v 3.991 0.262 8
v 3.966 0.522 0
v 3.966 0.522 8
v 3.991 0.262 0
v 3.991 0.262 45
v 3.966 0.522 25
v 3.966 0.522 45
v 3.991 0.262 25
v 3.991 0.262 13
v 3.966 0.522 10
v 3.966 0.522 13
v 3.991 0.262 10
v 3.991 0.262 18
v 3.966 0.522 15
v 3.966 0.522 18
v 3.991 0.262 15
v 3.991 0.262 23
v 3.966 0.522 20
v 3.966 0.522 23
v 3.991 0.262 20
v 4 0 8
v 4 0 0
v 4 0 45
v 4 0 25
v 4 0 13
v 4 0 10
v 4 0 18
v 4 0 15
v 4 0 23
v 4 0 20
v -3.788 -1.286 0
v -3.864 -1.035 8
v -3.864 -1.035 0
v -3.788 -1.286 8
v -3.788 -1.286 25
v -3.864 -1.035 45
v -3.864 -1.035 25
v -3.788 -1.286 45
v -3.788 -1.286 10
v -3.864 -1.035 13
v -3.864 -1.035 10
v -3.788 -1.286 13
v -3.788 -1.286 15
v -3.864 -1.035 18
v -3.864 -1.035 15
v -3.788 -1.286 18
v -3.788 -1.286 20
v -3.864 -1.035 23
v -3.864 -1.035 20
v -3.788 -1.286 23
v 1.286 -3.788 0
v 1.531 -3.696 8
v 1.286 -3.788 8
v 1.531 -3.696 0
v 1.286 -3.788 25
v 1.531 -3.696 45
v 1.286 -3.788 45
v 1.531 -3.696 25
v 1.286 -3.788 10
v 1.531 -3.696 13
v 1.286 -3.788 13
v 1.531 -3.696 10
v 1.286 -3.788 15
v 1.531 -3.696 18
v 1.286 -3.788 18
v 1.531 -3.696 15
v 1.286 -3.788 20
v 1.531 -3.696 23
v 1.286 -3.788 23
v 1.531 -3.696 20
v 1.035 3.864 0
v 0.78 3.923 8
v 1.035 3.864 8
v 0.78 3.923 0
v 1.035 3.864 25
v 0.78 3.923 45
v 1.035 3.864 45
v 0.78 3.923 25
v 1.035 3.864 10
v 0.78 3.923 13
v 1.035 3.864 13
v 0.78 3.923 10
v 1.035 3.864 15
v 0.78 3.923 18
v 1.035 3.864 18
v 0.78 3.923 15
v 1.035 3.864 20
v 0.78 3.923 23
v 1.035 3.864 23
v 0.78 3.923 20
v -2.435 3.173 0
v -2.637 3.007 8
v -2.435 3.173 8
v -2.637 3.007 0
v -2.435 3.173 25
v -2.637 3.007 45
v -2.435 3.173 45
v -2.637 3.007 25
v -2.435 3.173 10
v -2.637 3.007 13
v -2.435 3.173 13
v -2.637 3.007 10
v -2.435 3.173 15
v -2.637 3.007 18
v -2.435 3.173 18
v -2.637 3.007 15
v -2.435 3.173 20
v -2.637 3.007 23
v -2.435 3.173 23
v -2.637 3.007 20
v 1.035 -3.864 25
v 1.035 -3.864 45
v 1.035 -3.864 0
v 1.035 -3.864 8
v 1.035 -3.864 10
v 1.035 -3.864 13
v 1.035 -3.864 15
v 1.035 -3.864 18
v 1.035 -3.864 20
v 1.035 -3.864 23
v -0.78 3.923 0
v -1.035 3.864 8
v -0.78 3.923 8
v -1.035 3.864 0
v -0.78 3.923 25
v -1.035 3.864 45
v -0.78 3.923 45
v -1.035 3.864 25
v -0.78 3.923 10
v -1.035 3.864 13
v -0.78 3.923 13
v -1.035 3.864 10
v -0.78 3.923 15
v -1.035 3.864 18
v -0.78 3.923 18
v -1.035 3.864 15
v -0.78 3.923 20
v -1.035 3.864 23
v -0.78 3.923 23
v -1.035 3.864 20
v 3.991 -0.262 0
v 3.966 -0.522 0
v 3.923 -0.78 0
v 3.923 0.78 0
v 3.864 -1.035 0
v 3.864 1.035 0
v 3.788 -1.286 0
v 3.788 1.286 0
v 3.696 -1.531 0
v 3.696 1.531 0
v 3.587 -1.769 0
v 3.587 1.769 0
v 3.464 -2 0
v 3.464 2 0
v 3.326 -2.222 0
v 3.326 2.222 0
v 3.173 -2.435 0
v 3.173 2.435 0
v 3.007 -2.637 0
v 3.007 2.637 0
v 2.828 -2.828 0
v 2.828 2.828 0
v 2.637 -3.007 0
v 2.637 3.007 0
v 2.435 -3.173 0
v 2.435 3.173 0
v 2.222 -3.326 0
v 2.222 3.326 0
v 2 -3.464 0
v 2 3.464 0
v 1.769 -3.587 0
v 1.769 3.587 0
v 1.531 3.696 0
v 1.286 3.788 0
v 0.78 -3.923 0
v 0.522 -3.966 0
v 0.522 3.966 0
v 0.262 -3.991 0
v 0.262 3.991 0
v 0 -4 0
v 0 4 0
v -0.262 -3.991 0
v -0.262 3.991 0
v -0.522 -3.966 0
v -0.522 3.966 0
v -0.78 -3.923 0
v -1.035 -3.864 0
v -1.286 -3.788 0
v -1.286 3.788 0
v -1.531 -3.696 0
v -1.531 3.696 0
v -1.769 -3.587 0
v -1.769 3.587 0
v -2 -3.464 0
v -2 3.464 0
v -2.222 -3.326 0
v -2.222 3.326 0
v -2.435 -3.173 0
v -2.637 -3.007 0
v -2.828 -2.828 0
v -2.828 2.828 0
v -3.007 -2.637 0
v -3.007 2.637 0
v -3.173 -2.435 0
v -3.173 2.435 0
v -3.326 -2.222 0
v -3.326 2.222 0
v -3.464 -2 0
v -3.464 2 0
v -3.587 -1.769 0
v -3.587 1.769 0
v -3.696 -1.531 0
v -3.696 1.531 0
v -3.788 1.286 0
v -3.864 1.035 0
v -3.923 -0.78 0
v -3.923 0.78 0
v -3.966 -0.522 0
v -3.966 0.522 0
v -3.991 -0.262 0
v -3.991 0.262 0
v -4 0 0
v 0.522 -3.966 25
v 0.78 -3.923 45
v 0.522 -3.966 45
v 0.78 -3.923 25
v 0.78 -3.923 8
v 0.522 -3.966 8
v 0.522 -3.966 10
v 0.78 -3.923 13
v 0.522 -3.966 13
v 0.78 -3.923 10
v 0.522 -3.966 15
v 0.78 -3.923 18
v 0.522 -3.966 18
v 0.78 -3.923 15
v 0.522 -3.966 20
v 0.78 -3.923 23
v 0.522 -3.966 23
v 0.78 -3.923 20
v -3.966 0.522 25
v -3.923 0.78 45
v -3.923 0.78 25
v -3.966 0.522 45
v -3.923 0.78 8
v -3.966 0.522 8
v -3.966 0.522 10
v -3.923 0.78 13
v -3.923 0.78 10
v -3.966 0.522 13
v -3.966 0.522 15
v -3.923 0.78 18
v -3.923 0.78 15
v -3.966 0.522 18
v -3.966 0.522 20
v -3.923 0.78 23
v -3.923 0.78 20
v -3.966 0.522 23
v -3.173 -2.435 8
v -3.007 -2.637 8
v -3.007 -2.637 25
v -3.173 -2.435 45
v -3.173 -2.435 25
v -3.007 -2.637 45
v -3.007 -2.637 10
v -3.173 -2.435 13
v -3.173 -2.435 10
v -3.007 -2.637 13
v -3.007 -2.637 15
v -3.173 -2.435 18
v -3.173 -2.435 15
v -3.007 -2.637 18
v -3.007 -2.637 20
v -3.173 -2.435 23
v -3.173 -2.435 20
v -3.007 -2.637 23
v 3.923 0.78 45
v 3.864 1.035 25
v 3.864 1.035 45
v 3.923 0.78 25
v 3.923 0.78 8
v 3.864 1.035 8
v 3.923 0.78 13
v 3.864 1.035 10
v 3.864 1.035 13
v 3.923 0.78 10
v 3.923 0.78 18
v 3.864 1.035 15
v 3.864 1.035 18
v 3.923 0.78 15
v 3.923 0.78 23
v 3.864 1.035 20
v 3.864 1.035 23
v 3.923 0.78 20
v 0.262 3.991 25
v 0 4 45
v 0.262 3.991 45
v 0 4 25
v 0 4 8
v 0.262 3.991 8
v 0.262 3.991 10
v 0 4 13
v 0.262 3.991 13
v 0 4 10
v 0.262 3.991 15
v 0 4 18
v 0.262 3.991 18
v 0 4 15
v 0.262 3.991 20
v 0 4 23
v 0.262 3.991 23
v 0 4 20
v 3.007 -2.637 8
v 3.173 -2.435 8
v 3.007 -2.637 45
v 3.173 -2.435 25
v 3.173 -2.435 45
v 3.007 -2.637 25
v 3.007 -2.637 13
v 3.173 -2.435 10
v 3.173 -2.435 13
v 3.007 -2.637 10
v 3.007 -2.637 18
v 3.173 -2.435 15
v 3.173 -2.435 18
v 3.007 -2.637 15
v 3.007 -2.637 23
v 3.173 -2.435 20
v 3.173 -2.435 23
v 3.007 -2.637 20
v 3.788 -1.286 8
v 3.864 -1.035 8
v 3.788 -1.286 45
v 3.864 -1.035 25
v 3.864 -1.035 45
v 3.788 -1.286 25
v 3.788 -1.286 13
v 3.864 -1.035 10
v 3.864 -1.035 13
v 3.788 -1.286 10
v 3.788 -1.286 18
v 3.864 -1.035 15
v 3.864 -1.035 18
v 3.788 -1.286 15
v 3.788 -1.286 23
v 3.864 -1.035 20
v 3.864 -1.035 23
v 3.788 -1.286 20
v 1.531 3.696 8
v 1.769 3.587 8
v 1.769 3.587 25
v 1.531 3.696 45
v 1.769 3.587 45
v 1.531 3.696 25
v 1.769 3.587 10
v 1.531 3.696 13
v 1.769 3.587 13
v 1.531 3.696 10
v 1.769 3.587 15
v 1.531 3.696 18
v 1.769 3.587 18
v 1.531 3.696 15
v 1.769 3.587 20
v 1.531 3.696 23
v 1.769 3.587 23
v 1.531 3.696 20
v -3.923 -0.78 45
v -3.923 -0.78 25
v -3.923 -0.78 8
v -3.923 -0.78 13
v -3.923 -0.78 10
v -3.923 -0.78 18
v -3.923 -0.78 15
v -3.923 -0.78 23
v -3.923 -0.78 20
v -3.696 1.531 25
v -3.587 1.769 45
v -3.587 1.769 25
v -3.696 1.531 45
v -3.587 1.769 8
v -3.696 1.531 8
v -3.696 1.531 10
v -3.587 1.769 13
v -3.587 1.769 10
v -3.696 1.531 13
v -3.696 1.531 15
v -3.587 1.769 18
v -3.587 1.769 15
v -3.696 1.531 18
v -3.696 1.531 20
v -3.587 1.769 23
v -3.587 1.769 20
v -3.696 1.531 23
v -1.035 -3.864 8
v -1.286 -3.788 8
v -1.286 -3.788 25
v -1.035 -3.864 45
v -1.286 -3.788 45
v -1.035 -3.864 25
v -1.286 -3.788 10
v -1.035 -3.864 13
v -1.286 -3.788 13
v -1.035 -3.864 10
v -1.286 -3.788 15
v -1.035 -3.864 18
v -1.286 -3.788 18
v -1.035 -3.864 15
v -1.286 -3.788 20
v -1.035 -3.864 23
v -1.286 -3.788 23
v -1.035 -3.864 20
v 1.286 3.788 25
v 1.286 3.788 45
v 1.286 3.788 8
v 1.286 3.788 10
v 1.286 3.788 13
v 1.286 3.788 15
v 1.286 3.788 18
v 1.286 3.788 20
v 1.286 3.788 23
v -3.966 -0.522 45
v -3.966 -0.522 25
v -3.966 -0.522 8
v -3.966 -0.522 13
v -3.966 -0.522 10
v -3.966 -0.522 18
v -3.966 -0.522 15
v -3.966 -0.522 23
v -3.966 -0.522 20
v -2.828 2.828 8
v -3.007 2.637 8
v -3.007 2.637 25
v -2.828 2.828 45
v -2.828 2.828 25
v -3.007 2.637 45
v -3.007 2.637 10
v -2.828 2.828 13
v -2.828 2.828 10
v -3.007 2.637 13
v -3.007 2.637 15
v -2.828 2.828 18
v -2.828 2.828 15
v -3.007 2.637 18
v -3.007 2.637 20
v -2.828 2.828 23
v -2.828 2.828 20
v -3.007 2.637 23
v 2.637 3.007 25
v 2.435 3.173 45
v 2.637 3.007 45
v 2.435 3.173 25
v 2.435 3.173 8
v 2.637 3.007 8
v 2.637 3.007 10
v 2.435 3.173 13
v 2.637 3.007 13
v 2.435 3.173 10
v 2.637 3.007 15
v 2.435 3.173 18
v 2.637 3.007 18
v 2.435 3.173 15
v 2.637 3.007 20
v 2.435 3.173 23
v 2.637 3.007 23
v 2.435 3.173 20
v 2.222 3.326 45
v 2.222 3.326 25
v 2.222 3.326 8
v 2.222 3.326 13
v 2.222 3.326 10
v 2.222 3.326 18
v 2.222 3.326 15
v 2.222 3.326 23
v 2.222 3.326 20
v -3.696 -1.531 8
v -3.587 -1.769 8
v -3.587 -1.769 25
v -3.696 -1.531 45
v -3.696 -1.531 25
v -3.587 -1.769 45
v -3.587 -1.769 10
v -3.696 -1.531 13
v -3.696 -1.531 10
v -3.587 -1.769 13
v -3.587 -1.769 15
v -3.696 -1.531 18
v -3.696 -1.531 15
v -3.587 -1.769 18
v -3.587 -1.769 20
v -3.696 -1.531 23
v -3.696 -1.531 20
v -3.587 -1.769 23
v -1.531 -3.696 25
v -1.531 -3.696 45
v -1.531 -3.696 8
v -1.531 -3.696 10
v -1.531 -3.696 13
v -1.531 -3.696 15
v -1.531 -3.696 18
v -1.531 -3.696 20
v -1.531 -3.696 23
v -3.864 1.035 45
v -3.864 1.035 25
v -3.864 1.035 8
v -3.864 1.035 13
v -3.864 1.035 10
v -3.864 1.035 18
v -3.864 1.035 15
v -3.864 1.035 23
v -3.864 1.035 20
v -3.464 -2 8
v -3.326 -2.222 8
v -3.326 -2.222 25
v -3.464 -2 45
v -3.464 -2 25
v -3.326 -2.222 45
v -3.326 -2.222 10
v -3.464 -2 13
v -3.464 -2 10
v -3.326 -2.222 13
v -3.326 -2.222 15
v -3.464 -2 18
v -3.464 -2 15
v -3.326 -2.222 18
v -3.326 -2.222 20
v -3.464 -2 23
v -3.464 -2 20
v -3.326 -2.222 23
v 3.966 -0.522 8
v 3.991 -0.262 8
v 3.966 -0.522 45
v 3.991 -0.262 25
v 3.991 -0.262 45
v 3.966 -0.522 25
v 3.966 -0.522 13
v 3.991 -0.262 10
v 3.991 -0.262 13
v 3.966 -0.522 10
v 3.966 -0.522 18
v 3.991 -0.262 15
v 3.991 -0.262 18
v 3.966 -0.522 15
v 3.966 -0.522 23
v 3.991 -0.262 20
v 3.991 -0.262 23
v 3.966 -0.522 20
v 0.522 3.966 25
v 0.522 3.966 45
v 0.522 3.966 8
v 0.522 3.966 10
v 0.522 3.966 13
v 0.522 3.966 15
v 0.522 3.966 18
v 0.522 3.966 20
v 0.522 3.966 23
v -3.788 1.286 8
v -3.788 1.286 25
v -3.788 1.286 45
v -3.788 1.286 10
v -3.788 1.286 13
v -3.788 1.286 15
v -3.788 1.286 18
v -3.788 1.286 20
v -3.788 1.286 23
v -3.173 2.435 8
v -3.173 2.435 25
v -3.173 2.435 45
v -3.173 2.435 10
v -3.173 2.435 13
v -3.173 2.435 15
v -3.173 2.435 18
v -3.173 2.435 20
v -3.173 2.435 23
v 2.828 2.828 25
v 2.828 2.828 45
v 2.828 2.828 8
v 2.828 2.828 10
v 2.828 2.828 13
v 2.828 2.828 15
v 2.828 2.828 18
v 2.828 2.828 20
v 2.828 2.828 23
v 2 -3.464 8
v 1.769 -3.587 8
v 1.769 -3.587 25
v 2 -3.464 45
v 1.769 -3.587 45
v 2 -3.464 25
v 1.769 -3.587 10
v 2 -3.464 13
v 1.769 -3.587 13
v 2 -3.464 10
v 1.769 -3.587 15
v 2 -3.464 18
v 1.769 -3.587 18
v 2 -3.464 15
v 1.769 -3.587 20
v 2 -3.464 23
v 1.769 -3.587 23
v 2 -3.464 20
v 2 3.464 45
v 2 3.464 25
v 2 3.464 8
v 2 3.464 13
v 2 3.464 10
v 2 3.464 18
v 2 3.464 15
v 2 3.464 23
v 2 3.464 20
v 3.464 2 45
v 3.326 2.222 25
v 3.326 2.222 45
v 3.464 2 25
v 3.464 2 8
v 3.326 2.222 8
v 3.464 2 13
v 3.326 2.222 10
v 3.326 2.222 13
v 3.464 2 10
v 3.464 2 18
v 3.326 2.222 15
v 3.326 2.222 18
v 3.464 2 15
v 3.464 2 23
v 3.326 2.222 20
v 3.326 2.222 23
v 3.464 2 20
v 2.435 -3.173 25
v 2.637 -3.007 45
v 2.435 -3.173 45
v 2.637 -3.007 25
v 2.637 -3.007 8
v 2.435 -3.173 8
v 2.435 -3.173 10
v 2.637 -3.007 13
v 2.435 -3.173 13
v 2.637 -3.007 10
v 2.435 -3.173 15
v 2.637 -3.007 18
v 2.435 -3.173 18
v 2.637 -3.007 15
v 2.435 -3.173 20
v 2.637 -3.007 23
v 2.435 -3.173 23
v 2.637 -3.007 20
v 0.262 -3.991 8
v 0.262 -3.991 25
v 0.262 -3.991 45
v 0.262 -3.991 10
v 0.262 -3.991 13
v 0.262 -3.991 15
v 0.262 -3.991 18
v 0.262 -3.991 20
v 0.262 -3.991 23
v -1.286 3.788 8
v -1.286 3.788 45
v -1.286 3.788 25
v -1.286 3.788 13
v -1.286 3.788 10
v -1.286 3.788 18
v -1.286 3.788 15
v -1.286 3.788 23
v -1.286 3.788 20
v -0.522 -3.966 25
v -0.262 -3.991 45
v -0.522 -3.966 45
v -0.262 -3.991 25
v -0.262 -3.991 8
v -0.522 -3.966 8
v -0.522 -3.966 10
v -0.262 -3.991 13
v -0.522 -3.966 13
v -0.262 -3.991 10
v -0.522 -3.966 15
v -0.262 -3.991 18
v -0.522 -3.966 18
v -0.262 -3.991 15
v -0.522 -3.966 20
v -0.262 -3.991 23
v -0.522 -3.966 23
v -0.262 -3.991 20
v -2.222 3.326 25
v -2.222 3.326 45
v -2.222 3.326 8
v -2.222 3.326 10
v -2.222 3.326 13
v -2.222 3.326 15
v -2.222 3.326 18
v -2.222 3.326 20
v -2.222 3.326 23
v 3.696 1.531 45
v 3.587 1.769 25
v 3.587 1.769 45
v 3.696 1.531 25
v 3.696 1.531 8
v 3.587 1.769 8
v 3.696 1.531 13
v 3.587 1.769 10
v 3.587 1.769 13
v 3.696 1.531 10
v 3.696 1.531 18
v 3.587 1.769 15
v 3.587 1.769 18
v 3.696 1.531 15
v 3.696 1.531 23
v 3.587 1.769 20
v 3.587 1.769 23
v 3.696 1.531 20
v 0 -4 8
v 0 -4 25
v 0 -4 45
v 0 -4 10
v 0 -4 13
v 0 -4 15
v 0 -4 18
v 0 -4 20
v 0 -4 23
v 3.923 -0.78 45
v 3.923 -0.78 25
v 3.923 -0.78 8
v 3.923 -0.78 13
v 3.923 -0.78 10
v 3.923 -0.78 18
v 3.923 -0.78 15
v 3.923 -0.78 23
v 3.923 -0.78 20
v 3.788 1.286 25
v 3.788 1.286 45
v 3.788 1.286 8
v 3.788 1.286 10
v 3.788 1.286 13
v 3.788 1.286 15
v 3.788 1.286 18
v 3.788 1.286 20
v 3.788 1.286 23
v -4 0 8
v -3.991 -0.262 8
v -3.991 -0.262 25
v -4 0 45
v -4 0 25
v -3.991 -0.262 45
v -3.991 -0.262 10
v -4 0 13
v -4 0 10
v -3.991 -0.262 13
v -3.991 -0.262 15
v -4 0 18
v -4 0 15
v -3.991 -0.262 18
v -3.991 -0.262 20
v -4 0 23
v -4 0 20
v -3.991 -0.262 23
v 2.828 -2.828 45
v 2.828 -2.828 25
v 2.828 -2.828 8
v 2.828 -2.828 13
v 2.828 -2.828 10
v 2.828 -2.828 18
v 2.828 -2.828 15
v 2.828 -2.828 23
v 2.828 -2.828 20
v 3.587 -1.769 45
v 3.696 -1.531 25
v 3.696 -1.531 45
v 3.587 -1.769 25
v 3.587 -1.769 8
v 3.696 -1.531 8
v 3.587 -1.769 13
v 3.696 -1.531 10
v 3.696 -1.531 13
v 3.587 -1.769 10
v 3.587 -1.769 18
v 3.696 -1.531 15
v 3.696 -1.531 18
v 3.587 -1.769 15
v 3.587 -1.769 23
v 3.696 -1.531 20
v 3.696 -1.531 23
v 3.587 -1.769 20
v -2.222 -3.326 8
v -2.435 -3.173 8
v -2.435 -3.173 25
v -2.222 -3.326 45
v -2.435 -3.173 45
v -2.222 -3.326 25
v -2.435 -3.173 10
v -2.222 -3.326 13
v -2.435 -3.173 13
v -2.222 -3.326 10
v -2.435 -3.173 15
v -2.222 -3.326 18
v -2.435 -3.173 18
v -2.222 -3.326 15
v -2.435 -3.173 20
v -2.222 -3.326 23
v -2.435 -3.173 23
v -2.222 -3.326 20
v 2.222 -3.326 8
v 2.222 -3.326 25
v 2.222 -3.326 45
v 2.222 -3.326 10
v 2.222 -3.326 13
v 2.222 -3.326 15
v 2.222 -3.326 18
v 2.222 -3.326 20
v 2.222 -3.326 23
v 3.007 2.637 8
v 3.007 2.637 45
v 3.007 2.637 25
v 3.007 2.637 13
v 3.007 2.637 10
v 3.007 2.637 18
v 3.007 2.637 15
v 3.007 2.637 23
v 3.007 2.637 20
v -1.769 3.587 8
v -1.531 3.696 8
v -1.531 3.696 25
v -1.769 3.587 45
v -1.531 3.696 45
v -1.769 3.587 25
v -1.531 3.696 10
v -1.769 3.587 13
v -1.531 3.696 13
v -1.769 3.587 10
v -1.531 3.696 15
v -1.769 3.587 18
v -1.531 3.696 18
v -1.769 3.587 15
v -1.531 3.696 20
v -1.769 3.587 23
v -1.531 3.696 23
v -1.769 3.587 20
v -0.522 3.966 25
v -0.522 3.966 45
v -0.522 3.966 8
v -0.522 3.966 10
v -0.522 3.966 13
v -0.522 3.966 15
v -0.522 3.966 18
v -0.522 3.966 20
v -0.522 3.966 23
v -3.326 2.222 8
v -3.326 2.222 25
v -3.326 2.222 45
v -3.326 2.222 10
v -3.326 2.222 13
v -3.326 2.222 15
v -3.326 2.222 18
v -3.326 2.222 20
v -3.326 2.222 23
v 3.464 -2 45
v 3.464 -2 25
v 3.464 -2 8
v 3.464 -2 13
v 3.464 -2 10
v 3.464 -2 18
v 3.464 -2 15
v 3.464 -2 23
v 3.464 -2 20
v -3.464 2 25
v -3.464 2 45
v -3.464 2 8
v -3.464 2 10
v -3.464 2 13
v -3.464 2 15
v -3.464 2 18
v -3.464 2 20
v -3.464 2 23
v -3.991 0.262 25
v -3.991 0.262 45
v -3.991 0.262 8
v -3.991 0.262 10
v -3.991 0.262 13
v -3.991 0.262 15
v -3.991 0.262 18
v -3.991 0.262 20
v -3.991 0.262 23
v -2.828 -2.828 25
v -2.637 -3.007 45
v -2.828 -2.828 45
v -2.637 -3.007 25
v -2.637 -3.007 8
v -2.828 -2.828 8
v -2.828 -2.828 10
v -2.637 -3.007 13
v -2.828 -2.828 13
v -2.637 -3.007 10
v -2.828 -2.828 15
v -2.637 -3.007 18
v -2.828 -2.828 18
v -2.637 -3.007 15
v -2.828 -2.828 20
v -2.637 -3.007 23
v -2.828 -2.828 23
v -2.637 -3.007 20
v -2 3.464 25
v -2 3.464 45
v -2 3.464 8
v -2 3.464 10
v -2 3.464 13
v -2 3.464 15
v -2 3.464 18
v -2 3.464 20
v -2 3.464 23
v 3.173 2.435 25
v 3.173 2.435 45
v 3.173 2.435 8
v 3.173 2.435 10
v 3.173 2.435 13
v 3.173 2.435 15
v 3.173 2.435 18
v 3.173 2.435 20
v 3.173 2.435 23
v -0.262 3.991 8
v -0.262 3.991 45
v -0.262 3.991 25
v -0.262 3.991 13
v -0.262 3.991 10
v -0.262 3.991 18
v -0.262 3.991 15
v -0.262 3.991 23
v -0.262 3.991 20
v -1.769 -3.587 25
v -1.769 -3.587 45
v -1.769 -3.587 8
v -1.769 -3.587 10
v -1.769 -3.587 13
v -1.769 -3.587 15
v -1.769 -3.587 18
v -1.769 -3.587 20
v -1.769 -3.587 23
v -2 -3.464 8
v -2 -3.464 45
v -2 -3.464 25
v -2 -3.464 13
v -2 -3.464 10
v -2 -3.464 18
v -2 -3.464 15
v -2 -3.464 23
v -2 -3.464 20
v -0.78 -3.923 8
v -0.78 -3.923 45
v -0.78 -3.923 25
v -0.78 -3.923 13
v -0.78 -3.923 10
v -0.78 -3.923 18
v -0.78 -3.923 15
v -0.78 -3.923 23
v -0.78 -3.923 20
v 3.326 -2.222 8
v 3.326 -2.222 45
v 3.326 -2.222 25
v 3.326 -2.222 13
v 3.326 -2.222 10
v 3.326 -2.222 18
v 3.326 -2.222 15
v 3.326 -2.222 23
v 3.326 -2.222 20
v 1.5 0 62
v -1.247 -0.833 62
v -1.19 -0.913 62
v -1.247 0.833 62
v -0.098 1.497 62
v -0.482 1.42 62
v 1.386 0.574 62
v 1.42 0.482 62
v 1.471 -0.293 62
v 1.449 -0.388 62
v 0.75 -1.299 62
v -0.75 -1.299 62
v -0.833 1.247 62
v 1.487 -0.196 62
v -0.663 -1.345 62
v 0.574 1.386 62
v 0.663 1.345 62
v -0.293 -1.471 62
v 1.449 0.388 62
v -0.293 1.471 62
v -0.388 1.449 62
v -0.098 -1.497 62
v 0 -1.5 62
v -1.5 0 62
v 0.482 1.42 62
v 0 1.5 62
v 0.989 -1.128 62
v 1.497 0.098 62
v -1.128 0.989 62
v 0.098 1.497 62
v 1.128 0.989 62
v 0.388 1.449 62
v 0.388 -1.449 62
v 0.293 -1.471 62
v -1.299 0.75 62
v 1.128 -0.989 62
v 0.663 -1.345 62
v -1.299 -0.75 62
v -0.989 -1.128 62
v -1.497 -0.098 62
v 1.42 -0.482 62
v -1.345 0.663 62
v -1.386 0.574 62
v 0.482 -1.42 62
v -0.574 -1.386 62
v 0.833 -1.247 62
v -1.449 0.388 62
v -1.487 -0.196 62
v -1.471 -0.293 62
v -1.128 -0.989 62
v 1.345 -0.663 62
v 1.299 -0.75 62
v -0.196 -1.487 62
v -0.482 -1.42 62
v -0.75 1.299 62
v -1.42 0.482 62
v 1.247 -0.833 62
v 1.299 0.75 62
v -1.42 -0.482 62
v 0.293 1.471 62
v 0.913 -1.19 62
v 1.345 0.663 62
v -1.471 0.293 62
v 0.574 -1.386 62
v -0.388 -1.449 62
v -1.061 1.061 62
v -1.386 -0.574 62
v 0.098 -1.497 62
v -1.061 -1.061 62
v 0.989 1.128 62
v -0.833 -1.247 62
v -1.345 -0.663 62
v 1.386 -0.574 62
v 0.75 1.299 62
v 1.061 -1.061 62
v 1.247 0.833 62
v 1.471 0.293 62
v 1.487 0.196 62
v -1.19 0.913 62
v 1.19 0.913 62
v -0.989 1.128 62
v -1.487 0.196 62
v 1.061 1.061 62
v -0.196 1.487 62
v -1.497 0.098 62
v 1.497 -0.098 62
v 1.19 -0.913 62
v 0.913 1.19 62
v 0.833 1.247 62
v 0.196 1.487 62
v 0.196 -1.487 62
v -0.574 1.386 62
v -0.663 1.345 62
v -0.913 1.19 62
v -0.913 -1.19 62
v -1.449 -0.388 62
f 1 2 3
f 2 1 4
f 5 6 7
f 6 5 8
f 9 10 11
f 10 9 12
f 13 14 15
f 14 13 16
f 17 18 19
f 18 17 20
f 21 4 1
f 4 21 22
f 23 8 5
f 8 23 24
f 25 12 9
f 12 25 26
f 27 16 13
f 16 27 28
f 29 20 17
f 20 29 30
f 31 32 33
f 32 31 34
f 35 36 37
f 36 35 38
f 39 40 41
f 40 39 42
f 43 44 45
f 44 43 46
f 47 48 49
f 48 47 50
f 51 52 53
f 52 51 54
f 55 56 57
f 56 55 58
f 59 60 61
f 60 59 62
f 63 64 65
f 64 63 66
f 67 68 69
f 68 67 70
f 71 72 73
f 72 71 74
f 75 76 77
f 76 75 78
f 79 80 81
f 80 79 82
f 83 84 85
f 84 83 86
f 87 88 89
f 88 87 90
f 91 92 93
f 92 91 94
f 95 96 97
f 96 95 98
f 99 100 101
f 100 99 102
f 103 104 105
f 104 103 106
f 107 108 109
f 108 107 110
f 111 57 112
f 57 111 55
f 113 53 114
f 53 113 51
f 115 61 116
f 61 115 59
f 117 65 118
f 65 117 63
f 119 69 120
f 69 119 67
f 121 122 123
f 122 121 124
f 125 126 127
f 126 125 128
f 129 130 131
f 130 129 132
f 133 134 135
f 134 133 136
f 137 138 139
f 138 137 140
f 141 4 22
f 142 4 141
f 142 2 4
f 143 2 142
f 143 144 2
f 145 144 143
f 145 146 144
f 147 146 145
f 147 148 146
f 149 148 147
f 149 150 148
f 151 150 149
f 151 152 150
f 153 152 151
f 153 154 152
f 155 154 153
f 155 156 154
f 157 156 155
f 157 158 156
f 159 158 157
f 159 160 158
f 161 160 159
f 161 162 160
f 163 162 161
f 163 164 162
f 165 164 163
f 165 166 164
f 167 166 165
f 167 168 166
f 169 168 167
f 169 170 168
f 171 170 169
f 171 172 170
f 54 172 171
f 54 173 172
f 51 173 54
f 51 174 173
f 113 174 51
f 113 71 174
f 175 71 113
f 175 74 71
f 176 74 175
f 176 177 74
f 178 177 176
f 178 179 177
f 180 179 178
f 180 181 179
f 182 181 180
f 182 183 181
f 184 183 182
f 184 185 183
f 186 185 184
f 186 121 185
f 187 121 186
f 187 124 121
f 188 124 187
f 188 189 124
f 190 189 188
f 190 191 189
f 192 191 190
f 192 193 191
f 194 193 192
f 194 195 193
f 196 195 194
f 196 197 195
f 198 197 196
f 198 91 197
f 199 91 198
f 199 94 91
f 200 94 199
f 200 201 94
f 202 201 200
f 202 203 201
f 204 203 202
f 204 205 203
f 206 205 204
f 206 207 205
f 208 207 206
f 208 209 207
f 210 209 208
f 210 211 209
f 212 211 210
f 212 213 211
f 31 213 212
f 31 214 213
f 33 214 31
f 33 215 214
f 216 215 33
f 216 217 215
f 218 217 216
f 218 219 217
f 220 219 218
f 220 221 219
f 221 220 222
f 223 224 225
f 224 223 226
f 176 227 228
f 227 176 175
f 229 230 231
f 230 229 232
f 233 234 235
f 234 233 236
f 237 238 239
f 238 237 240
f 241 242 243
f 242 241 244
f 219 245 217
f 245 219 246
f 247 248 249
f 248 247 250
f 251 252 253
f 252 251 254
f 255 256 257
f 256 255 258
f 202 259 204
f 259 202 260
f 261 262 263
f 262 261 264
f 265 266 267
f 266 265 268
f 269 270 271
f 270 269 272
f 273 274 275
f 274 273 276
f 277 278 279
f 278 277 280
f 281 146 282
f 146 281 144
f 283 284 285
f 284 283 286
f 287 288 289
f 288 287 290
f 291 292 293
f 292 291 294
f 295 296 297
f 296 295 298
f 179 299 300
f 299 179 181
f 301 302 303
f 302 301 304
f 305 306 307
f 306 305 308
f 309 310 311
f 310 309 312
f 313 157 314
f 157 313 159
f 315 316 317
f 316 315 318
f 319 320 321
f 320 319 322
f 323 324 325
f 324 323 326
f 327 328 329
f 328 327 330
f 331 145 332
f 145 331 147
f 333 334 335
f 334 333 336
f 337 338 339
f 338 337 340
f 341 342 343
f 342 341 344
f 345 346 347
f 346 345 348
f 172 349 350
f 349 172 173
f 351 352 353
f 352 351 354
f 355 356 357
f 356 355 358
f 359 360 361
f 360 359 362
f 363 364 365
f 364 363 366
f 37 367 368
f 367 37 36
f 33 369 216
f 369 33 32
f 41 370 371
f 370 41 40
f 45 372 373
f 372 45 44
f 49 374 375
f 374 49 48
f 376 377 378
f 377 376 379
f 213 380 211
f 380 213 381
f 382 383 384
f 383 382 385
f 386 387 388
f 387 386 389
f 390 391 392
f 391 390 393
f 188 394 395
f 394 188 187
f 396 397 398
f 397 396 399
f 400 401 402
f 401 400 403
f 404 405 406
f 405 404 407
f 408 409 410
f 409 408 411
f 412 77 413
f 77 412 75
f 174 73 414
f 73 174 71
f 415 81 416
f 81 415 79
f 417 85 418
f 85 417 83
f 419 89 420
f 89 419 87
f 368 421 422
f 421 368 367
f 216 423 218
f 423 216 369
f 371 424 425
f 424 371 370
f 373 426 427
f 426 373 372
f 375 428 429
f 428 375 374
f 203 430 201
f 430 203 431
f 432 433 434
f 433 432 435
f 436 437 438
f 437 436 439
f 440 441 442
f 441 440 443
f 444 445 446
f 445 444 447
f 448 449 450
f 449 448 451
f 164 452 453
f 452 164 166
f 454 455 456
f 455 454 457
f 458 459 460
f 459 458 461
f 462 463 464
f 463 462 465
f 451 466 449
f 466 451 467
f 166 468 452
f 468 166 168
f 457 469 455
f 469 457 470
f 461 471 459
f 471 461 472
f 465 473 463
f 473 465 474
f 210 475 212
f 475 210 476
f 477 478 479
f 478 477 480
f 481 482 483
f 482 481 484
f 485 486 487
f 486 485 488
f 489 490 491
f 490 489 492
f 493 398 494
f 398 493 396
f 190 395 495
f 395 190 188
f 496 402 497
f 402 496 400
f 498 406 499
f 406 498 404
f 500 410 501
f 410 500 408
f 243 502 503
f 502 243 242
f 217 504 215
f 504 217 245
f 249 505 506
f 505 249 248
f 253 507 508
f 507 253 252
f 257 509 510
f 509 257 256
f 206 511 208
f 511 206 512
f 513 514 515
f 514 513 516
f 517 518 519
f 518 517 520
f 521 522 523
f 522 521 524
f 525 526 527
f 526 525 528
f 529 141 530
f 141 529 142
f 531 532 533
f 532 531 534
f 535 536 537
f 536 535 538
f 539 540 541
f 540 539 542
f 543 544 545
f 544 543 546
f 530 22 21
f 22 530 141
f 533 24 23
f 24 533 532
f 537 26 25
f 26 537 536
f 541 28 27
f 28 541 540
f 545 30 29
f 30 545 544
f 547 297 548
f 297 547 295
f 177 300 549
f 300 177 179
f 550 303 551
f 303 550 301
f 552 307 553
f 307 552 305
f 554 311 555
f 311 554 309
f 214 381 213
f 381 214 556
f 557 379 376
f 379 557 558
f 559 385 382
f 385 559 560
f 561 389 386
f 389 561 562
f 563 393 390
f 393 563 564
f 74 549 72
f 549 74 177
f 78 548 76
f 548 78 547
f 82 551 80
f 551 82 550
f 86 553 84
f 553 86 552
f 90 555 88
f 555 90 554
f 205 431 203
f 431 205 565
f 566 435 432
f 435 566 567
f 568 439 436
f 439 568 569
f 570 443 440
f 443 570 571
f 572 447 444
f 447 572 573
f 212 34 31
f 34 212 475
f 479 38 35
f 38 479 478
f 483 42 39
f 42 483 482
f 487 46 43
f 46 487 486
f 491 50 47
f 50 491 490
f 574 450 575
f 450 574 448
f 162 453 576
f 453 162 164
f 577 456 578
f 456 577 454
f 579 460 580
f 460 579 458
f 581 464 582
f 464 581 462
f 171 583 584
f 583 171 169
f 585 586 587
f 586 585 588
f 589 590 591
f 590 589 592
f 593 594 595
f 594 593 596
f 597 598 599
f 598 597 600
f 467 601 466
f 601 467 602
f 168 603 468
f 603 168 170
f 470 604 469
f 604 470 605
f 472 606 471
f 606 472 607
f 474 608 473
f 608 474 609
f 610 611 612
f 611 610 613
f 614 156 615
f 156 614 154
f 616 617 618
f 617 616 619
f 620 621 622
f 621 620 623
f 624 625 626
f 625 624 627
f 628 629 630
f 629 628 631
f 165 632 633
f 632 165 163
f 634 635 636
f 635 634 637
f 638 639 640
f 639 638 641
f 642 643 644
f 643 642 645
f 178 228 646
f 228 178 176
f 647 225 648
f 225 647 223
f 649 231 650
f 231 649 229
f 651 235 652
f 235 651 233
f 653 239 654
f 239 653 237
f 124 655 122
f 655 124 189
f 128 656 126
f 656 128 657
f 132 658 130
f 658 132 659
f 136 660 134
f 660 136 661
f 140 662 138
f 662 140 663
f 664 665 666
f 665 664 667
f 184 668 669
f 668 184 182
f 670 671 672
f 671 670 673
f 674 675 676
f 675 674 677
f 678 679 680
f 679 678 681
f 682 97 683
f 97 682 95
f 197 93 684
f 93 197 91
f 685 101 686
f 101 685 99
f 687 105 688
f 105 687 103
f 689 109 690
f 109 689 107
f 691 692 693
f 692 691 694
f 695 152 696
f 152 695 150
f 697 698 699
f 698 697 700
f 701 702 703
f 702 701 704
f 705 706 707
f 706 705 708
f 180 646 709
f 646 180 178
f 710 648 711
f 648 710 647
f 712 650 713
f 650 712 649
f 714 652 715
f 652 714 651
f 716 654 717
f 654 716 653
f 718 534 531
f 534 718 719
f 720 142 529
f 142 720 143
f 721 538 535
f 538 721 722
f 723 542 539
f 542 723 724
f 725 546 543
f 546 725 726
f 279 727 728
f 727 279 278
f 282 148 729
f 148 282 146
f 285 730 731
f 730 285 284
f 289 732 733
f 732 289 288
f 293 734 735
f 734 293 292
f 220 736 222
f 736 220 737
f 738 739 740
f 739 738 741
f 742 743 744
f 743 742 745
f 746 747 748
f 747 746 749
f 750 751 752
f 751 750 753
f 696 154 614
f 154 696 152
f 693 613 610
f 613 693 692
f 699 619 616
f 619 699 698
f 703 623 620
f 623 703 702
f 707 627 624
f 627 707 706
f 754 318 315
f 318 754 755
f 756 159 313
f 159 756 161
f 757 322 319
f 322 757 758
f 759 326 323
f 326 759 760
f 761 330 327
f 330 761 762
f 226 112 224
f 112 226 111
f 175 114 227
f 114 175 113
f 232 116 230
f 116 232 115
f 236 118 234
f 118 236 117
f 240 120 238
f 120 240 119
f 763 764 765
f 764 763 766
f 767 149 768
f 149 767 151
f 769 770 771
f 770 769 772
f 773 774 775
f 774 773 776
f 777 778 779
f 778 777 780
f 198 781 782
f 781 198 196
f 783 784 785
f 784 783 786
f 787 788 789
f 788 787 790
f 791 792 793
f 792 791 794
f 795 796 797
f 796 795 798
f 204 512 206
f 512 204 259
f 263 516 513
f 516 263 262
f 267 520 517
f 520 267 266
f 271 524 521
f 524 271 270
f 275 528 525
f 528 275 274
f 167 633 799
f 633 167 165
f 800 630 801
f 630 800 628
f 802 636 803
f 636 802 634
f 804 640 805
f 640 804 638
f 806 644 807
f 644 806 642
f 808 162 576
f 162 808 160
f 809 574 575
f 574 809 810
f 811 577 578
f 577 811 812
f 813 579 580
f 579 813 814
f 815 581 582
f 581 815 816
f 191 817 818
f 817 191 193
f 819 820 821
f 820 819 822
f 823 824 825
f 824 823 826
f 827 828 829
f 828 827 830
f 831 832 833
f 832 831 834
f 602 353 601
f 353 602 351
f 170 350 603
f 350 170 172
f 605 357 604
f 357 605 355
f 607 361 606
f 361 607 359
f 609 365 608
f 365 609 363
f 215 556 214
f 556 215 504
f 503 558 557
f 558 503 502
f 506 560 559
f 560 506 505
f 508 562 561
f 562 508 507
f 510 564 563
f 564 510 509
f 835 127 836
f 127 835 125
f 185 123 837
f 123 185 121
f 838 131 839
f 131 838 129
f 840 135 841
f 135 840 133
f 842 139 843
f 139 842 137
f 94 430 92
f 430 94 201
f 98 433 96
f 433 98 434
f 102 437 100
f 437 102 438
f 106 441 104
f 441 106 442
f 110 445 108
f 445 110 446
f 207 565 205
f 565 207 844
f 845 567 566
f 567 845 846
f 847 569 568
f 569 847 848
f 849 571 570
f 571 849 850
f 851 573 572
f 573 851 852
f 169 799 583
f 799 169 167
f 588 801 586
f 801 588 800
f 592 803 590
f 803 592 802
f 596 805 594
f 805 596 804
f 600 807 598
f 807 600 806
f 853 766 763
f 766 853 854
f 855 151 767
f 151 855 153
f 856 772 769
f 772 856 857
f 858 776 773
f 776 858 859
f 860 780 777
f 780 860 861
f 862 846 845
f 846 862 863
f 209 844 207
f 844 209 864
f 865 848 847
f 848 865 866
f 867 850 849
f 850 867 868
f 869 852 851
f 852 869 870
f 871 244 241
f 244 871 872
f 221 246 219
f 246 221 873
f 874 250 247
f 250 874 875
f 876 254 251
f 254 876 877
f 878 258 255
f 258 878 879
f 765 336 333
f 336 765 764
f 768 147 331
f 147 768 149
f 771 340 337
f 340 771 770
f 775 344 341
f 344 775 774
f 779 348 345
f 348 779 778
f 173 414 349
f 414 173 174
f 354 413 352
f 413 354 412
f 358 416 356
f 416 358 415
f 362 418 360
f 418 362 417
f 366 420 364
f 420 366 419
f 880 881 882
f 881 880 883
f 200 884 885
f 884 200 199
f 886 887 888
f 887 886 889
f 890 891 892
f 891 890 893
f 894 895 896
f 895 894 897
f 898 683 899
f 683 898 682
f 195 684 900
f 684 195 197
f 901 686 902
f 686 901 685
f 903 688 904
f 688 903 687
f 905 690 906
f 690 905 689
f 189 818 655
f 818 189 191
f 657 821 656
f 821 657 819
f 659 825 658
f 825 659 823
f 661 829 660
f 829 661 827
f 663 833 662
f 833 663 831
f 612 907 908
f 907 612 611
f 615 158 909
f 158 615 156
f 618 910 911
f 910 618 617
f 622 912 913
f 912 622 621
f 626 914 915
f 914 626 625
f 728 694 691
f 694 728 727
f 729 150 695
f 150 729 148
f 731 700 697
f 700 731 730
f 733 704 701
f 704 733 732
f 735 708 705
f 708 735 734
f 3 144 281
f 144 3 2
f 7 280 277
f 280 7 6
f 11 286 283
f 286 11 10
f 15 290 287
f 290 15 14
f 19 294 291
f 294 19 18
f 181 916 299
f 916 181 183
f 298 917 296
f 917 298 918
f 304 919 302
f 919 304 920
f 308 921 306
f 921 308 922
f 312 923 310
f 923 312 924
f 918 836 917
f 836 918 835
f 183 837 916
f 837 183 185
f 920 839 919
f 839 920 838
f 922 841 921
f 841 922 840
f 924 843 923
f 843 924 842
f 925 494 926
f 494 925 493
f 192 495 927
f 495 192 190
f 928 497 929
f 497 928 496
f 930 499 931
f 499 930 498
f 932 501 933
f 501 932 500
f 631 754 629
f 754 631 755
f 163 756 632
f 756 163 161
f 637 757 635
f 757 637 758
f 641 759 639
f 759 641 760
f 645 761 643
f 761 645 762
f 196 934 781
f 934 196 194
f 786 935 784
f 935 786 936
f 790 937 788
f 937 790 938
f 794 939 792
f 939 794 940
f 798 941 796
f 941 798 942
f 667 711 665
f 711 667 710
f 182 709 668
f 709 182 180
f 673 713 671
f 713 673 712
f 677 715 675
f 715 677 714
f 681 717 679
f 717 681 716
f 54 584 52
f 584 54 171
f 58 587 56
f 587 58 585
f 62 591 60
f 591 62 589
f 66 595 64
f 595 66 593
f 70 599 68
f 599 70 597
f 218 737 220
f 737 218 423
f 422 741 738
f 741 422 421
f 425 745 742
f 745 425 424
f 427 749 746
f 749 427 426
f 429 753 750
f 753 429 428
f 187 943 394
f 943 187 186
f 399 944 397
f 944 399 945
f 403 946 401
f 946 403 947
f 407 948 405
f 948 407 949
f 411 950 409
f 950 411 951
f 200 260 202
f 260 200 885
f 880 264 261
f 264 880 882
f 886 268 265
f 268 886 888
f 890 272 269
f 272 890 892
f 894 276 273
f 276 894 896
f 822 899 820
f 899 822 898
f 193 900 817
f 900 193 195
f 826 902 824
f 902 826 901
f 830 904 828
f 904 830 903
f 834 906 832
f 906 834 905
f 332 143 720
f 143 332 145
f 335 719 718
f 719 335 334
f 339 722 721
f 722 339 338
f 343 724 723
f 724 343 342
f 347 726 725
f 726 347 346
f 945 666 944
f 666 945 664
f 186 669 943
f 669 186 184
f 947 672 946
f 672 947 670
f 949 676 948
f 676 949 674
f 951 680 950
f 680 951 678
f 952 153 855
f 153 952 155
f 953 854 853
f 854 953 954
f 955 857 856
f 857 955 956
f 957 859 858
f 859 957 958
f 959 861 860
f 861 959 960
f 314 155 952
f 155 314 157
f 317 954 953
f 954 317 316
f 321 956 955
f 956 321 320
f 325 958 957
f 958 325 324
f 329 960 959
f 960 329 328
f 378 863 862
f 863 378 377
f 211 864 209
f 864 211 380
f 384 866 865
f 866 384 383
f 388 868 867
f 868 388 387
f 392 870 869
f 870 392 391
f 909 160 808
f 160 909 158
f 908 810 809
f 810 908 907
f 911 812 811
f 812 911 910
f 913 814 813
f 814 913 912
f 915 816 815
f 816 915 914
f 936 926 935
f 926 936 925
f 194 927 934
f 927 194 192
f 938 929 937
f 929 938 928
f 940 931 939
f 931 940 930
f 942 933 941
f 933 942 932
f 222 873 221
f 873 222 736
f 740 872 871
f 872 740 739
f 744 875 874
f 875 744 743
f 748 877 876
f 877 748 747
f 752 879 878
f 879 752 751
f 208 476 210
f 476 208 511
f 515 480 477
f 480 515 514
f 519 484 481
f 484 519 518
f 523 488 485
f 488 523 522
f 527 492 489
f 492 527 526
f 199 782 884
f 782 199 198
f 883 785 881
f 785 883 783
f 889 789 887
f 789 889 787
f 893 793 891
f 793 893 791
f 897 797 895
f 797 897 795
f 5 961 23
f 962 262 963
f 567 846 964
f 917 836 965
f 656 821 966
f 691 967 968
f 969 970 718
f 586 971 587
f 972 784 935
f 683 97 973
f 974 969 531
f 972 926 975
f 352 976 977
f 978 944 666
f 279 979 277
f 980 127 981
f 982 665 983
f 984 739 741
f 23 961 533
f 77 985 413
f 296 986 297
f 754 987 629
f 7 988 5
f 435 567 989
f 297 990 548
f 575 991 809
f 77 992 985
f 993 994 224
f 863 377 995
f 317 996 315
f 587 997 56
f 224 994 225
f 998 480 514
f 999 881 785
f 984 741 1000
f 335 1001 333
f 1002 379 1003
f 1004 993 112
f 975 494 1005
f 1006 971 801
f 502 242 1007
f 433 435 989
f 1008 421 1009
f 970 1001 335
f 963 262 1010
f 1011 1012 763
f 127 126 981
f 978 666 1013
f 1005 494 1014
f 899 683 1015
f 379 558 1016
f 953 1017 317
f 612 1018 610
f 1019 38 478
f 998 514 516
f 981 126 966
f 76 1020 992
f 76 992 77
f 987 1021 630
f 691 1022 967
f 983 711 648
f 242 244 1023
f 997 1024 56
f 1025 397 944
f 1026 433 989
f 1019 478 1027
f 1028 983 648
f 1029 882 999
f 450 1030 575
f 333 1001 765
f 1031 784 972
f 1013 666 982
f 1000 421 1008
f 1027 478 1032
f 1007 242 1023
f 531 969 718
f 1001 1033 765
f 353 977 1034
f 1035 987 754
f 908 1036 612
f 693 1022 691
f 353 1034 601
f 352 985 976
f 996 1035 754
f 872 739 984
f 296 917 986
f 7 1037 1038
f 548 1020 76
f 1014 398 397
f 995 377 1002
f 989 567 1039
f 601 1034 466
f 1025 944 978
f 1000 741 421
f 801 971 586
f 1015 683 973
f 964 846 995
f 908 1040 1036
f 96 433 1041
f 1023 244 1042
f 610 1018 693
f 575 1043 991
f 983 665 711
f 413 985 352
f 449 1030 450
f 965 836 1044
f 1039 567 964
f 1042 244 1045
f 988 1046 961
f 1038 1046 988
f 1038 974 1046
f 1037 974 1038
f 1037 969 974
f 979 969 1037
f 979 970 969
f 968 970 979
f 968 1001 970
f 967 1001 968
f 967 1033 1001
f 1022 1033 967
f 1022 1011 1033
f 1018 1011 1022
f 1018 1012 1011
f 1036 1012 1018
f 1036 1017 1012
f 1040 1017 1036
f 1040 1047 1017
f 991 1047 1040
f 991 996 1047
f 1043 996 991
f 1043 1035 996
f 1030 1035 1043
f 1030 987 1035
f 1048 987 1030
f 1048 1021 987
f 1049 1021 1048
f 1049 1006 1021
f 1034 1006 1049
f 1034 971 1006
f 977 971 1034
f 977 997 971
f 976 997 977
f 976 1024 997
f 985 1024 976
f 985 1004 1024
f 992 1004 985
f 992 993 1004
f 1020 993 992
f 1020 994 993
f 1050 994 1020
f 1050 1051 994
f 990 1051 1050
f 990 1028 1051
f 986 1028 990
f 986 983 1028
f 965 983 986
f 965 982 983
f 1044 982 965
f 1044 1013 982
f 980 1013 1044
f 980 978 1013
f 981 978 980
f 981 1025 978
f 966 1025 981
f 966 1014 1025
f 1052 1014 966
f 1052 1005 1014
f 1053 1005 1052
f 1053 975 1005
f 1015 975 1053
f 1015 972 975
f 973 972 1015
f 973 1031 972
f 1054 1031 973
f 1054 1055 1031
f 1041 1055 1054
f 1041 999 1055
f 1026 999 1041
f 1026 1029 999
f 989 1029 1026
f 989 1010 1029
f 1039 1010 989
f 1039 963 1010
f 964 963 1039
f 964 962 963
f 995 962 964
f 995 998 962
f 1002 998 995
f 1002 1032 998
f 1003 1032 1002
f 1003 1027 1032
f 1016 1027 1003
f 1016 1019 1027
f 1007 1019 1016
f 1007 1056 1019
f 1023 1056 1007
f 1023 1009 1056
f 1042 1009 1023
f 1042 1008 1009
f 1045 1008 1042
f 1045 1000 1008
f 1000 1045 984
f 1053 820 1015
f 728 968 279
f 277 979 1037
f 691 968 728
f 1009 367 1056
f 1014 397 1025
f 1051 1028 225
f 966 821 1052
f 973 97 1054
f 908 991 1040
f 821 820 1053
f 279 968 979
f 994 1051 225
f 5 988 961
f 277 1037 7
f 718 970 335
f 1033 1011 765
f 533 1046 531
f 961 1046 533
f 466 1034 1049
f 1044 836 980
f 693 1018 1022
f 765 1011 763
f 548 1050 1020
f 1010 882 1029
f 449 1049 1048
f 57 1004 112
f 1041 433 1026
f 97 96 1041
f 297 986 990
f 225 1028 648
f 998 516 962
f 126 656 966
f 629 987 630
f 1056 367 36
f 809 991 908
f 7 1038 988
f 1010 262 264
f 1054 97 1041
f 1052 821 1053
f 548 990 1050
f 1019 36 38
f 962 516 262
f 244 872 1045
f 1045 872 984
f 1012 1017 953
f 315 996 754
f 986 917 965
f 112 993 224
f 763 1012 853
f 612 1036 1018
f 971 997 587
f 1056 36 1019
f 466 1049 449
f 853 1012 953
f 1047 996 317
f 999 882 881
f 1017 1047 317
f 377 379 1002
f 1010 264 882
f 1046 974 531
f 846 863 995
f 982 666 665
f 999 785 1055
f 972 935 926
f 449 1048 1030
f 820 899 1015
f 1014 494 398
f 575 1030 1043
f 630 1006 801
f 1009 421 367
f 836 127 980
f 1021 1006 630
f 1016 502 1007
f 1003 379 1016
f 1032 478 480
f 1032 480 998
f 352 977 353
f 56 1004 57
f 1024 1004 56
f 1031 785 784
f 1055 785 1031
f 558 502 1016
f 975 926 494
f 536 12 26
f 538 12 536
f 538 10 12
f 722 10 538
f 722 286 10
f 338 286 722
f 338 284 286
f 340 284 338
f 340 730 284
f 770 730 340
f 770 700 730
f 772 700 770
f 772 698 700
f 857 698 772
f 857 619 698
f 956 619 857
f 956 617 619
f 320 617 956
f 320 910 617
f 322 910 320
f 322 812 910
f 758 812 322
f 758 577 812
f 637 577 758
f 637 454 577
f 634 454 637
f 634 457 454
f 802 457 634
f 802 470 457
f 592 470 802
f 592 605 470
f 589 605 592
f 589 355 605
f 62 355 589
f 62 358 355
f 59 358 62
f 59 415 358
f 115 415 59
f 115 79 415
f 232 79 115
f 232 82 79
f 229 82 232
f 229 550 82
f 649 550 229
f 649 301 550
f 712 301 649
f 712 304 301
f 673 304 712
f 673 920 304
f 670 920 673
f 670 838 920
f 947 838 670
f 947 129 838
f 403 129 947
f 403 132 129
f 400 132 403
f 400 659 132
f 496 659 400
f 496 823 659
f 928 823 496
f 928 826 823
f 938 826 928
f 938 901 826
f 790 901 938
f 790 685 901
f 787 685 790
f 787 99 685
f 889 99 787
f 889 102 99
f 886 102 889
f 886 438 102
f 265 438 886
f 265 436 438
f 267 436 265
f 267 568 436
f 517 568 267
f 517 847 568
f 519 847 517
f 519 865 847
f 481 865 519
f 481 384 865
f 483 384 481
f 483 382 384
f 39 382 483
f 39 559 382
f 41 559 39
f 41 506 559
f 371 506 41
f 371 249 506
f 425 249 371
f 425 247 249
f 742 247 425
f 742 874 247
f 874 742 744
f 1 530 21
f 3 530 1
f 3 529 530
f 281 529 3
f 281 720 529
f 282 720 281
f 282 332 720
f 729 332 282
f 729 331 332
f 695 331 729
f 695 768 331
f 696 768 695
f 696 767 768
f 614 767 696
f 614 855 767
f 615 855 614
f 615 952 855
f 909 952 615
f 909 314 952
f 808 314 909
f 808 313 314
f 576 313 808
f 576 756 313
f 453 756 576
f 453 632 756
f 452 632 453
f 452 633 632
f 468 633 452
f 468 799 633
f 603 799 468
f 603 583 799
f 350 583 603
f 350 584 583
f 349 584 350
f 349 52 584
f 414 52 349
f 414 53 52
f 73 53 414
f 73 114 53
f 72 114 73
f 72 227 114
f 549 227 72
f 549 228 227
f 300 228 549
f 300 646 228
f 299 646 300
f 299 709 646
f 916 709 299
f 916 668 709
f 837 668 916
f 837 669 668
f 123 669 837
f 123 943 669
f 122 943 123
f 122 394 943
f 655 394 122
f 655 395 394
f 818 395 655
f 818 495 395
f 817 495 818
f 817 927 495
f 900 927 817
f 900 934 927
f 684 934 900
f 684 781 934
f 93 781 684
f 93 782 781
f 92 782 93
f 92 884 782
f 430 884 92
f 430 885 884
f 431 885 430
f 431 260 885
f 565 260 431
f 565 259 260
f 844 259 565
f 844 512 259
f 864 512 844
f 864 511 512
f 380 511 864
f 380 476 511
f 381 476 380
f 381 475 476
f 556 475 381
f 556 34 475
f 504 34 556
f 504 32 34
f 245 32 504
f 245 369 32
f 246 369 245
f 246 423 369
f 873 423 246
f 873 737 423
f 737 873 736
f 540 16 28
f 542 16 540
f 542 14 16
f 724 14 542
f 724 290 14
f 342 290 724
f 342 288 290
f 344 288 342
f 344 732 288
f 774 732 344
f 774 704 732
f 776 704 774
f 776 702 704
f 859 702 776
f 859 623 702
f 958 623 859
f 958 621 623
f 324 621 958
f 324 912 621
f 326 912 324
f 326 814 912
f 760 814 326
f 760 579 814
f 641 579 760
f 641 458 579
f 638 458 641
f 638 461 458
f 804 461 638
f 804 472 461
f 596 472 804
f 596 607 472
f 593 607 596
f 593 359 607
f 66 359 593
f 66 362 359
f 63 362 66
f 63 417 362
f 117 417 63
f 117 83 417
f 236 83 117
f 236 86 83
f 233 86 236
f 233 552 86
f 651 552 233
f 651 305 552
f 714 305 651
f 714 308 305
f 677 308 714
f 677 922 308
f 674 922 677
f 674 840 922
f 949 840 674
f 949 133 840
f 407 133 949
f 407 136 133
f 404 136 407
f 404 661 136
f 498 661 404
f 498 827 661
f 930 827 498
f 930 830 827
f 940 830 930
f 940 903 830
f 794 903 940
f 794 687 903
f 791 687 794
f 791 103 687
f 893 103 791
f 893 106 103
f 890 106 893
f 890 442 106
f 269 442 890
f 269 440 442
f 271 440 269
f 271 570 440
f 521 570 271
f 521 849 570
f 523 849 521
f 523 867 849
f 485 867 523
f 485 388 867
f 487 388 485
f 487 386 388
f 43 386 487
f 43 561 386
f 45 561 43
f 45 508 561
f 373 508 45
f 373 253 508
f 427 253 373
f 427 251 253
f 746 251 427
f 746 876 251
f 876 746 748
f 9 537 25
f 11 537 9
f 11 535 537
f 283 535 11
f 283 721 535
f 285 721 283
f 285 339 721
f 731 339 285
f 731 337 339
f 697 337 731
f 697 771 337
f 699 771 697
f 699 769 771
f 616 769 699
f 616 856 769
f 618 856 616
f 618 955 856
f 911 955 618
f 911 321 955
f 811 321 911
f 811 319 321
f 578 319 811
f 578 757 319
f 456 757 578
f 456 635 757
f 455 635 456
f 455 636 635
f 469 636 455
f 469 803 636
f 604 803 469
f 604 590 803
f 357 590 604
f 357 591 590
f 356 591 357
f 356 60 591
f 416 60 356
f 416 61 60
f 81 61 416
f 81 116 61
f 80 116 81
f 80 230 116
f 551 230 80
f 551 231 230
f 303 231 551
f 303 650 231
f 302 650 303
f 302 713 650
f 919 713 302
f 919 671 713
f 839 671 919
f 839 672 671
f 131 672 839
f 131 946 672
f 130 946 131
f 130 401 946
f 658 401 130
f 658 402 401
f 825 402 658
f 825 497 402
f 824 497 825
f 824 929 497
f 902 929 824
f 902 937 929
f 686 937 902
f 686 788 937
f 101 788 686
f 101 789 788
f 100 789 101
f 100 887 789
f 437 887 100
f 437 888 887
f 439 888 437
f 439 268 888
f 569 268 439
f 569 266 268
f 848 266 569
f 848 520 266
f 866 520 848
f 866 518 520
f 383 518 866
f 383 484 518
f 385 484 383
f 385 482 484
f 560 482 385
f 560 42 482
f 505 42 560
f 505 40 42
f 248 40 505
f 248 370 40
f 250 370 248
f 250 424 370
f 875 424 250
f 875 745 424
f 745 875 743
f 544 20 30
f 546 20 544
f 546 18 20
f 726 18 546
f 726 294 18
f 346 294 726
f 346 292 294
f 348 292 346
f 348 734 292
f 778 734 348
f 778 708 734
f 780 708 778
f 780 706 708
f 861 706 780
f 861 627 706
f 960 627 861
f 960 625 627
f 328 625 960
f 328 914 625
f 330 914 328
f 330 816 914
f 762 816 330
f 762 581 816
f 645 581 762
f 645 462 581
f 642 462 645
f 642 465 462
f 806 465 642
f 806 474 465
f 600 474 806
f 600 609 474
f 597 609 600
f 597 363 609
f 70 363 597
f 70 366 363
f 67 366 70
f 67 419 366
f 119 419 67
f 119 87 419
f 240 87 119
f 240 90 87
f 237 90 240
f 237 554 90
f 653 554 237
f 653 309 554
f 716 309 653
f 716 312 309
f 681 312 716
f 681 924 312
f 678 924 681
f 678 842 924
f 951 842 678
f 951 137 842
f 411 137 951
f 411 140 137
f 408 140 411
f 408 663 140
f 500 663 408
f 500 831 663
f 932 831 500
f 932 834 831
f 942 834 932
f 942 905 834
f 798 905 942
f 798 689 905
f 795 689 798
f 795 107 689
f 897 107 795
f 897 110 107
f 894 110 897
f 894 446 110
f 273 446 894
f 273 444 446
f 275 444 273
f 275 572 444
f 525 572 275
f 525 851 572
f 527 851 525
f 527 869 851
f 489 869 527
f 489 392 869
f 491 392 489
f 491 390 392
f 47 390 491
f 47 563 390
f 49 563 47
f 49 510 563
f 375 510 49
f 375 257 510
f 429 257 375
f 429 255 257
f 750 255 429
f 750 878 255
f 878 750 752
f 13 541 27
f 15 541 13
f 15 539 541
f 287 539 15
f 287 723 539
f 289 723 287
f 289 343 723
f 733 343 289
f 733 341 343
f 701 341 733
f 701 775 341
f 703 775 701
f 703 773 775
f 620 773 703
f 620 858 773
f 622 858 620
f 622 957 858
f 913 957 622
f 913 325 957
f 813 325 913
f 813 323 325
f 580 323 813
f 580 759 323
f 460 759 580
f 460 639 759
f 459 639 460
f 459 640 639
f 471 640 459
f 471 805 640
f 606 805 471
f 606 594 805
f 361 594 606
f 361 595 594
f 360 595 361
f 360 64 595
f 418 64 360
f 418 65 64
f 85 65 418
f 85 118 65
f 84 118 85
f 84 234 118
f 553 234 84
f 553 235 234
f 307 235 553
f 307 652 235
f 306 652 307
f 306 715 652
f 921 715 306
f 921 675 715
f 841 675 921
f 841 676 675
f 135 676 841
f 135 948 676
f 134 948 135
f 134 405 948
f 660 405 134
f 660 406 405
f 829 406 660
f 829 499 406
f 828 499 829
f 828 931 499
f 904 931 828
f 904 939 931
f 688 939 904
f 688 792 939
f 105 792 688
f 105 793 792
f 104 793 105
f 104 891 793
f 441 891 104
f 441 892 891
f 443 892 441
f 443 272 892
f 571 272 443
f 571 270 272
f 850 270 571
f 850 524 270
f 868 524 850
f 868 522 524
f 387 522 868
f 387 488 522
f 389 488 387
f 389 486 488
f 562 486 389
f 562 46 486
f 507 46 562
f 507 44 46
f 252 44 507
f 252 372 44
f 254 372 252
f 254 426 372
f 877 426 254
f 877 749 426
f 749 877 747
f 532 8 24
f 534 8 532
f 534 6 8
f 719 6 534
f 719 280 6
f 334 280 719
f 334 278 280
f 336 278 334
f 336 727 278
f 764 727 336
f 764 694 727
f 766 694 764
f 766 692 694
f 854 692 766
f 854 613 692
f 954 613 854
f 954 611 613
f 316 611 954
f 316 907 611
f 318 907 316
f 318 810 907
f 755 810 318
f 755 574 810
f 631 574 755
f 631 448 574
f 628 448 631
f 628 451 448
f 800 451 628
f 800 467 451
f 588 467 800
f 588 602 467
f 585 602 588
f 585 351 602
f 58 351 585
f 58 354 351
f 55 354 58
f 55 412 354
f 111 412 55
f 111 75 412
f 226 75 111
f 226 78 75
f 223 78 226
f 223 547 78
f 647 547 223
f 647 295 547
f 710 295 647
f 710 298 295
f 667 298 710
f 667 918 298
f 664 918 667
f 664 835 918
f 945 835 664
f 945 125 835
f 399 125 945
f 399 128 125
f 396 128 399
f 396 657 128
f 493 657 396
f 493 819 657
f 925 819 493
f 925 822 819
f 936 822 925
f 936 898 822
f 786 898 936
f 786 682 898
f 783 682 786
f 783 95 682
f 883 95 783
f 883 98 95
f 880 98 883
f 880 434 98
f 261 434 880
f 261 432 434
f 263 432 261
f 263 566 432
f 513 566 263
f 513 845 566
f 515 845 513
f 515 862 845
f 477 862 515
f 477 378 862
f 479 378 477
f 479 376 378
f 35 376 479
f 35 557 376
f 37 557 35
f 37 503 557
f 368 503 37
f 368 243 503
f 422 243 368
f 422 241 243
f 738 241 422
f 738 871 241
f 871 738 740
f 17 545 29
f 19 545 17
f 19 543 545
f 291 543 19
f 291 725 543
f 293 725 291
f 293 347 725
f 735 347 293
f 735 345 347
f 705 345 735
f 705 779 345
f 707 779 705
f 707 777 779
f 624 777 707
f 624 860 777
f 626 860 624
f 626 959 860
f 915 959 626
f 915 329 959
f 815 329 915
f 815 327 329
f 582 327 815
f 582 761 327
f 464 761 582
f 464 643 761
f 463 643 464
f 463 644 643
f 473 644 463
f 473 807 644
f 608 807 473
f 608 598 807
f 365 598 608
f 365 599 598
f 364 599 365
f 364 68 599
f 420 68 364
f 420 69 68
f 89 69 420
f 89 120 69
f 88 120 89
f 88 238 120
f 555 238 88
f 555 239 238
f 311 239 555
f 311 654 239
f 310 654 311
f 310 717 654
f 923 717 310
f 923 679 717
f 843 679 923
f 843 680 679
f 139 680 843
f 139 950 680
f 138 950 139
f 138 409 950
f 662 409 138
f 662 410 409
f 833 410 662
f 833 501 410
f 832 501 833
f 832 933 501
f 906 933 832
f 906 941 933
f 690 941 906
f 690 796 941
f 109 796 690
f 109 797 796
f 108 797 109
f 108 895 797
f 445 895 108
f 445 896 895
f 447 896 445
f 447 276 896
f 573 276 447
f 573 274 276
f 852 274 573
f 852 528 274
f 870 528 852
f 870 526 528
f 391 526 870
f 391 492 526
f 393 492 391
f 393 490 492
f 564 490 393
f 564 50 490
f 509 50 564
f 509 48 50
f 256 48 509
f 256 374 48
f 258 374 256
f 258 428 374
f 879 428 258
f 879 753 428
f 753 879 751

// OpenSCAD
// Pestle for grinding tissue inside a 1.5 mL microcentrifuge tube
// Print orientation: standing upright on the bed (z = 0), centred on origin in X/Y

// ---------------- Parameters ----------------
handle_d      = 8;    // handle diameter (mm)
handle_h      = 45;   // handle height (mm), z = 0..45
cone_d_top    = 8;    // cone diameter at its base, same as handle (mm)
cone_d_tip    = 3;    // cone diameter at its tip (mm)
cone_top_z    = 45;   // cone base height (mm)
cone_tip_z    = 62;   // cone tip height (mm)
tip_d         = 3;    // rounded tip sphere diameter (mm)
tip_z         = 62;   // sphere centre height (mm)
groove_count  = 4;    // number of circumferential grip grooves
groove_w      = 2;    // groove width (mm), measured along Z
groove_depth  = 1;    // groove depth (mm), cut into the handle
cut_extra     = 0.5;  // overshoot of cutters past faces (mm)

$fn = 96;             // curve resolution

// ---------------- Model ----------------
difference() {
    union() {
        // (1) Cylindrical handle
        cylinder(d = handle_d, h = handle_h);

        // (2) Tapering cone: 8 mm at z = 45 down to 3 mm at z = 62
        translate([0, 0, cone_top_z])
            cylinder(d1 = cone_d_top, d2 = cone_d_tip, h = cone_tip_z - cone_top_z);

        // (3) Rounded tip: 3 mm sphere centred at z = 62
        translate([0, 0, tip_z - tip_d / 2])
            sphere(d = tip_d);
    }

    // Grip grooves, centred at z = 10, 15, 20, 25
    for (i = [0 : groove_count - 1]) {
        z_c = 10 + i * 5;
        translate([0, 0, z_c - groove_w / 2])
            cylinder(d = handle_d + 2 * cut_extra, h = groove_w, center = true);
    }
}
